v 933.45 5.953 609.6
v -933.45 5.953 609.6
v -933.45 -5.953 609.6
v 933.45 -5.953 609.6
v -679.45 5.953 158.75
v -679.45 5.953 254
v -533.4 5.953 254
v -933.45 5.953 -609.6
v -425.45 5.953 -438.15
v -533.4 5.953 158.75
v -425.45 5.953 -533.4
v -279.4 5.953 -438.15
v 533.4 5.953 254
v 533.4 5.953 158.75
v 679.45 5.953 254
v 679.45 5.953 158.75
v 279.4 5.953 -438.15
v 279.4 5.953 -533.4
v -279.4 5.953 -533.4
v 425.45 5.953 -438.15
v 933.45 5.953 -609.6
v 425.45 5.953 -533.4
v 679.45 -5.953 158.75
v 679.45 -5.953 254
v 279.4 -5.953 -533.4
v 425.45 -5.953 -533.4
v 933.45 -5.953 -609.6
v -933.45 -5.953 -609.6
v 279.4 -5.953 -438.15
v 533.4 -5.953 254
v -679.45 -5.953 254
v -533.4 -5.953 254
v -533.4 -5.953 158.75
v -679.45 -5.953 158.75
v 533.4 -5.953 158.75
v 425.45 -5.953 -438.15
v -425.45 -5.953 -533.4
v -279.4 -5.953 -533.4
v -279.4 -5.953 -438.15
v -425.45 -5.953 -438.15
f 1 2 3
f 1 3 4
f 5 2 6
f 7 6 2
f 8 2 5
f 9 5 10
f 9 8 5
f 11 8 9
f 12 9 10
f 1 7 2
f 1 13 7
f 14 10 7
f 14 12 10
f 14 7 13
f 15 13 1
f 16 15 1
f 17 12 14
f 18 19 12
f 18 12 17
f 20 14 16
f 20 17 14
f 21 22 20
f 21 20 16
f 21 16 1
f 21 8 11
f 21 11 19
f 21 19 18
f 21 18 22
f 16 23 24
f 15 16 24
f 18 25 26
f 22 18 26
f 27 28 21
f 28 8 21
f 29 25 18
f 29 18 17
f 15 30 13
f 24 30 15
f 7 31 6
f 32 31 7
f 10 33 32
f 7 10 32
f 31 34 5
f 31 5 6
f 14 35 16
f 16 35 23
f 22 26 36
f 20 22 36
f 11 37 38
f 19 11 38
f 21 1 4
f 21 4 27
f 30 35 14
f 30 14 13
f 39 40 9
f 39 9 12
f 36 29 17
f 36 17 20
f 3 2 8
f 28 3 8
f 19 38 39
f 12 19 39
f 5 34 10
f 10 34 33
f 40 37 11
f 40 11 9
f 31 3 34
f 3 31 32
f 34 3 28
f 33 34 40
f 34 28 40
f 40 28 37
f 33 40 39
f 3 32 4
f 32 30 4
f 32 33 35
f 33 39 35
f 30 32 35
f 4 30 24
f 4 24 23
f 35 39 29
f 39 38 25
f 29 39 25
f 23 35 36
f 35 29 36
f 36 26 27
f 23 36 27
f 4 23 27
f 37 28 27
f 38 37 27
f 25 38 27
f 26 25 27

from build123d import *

# Parameters (mm, degrees)
SKETCH1_W           = 1866.9
SKETCH1_H           = 1219.2
BOSS_EXTRUDE1_DEPTH = 5.953125
SKETCH4_W           = 146.05
SKETCH4_H           = 95.25
CUT_EXTRUDE3_DEPTH  = 12.90625


with BuildPart() as part:
    # Sketch1 → Boss-Extrude1 (new body, symmetric)
    with BuildSketch(Plane(origin=(0, 0, 0), x_dir=(1, 0, 0), z_dir=(0, 1, 0))):
        Rectangle(SKETCH1_W, SKETCH1_H)
    extrude(amount=BOSS_EXTRUDE1_DEPTH, both=True)

    # Sketch4 → Cut-Extrude3 (cut, through all)
    with BuildSketch(Plane.XZ.offset(5.953125)):
        with Locations((352.425, -485.775)):
            Rectangle(SKETCH4_W, SKETCH4_H)
        with Locations((-352.425, -485.775)):
            Rectangle(SKETCH4_W, SKETCH4_H)
        with Locations((-606.425, 206.375)):
            Rectangle(SKETCH4_W, SKETCH4_H)
        with Locations((606.425, 206.375)):
            Rectangle(SKETCH4_W, SKETCH4_H)
    extrude(amount=-CUT_EXTRUDE3_DEPTH, mode=Mode.SUBTRACT)


solid = part.part
